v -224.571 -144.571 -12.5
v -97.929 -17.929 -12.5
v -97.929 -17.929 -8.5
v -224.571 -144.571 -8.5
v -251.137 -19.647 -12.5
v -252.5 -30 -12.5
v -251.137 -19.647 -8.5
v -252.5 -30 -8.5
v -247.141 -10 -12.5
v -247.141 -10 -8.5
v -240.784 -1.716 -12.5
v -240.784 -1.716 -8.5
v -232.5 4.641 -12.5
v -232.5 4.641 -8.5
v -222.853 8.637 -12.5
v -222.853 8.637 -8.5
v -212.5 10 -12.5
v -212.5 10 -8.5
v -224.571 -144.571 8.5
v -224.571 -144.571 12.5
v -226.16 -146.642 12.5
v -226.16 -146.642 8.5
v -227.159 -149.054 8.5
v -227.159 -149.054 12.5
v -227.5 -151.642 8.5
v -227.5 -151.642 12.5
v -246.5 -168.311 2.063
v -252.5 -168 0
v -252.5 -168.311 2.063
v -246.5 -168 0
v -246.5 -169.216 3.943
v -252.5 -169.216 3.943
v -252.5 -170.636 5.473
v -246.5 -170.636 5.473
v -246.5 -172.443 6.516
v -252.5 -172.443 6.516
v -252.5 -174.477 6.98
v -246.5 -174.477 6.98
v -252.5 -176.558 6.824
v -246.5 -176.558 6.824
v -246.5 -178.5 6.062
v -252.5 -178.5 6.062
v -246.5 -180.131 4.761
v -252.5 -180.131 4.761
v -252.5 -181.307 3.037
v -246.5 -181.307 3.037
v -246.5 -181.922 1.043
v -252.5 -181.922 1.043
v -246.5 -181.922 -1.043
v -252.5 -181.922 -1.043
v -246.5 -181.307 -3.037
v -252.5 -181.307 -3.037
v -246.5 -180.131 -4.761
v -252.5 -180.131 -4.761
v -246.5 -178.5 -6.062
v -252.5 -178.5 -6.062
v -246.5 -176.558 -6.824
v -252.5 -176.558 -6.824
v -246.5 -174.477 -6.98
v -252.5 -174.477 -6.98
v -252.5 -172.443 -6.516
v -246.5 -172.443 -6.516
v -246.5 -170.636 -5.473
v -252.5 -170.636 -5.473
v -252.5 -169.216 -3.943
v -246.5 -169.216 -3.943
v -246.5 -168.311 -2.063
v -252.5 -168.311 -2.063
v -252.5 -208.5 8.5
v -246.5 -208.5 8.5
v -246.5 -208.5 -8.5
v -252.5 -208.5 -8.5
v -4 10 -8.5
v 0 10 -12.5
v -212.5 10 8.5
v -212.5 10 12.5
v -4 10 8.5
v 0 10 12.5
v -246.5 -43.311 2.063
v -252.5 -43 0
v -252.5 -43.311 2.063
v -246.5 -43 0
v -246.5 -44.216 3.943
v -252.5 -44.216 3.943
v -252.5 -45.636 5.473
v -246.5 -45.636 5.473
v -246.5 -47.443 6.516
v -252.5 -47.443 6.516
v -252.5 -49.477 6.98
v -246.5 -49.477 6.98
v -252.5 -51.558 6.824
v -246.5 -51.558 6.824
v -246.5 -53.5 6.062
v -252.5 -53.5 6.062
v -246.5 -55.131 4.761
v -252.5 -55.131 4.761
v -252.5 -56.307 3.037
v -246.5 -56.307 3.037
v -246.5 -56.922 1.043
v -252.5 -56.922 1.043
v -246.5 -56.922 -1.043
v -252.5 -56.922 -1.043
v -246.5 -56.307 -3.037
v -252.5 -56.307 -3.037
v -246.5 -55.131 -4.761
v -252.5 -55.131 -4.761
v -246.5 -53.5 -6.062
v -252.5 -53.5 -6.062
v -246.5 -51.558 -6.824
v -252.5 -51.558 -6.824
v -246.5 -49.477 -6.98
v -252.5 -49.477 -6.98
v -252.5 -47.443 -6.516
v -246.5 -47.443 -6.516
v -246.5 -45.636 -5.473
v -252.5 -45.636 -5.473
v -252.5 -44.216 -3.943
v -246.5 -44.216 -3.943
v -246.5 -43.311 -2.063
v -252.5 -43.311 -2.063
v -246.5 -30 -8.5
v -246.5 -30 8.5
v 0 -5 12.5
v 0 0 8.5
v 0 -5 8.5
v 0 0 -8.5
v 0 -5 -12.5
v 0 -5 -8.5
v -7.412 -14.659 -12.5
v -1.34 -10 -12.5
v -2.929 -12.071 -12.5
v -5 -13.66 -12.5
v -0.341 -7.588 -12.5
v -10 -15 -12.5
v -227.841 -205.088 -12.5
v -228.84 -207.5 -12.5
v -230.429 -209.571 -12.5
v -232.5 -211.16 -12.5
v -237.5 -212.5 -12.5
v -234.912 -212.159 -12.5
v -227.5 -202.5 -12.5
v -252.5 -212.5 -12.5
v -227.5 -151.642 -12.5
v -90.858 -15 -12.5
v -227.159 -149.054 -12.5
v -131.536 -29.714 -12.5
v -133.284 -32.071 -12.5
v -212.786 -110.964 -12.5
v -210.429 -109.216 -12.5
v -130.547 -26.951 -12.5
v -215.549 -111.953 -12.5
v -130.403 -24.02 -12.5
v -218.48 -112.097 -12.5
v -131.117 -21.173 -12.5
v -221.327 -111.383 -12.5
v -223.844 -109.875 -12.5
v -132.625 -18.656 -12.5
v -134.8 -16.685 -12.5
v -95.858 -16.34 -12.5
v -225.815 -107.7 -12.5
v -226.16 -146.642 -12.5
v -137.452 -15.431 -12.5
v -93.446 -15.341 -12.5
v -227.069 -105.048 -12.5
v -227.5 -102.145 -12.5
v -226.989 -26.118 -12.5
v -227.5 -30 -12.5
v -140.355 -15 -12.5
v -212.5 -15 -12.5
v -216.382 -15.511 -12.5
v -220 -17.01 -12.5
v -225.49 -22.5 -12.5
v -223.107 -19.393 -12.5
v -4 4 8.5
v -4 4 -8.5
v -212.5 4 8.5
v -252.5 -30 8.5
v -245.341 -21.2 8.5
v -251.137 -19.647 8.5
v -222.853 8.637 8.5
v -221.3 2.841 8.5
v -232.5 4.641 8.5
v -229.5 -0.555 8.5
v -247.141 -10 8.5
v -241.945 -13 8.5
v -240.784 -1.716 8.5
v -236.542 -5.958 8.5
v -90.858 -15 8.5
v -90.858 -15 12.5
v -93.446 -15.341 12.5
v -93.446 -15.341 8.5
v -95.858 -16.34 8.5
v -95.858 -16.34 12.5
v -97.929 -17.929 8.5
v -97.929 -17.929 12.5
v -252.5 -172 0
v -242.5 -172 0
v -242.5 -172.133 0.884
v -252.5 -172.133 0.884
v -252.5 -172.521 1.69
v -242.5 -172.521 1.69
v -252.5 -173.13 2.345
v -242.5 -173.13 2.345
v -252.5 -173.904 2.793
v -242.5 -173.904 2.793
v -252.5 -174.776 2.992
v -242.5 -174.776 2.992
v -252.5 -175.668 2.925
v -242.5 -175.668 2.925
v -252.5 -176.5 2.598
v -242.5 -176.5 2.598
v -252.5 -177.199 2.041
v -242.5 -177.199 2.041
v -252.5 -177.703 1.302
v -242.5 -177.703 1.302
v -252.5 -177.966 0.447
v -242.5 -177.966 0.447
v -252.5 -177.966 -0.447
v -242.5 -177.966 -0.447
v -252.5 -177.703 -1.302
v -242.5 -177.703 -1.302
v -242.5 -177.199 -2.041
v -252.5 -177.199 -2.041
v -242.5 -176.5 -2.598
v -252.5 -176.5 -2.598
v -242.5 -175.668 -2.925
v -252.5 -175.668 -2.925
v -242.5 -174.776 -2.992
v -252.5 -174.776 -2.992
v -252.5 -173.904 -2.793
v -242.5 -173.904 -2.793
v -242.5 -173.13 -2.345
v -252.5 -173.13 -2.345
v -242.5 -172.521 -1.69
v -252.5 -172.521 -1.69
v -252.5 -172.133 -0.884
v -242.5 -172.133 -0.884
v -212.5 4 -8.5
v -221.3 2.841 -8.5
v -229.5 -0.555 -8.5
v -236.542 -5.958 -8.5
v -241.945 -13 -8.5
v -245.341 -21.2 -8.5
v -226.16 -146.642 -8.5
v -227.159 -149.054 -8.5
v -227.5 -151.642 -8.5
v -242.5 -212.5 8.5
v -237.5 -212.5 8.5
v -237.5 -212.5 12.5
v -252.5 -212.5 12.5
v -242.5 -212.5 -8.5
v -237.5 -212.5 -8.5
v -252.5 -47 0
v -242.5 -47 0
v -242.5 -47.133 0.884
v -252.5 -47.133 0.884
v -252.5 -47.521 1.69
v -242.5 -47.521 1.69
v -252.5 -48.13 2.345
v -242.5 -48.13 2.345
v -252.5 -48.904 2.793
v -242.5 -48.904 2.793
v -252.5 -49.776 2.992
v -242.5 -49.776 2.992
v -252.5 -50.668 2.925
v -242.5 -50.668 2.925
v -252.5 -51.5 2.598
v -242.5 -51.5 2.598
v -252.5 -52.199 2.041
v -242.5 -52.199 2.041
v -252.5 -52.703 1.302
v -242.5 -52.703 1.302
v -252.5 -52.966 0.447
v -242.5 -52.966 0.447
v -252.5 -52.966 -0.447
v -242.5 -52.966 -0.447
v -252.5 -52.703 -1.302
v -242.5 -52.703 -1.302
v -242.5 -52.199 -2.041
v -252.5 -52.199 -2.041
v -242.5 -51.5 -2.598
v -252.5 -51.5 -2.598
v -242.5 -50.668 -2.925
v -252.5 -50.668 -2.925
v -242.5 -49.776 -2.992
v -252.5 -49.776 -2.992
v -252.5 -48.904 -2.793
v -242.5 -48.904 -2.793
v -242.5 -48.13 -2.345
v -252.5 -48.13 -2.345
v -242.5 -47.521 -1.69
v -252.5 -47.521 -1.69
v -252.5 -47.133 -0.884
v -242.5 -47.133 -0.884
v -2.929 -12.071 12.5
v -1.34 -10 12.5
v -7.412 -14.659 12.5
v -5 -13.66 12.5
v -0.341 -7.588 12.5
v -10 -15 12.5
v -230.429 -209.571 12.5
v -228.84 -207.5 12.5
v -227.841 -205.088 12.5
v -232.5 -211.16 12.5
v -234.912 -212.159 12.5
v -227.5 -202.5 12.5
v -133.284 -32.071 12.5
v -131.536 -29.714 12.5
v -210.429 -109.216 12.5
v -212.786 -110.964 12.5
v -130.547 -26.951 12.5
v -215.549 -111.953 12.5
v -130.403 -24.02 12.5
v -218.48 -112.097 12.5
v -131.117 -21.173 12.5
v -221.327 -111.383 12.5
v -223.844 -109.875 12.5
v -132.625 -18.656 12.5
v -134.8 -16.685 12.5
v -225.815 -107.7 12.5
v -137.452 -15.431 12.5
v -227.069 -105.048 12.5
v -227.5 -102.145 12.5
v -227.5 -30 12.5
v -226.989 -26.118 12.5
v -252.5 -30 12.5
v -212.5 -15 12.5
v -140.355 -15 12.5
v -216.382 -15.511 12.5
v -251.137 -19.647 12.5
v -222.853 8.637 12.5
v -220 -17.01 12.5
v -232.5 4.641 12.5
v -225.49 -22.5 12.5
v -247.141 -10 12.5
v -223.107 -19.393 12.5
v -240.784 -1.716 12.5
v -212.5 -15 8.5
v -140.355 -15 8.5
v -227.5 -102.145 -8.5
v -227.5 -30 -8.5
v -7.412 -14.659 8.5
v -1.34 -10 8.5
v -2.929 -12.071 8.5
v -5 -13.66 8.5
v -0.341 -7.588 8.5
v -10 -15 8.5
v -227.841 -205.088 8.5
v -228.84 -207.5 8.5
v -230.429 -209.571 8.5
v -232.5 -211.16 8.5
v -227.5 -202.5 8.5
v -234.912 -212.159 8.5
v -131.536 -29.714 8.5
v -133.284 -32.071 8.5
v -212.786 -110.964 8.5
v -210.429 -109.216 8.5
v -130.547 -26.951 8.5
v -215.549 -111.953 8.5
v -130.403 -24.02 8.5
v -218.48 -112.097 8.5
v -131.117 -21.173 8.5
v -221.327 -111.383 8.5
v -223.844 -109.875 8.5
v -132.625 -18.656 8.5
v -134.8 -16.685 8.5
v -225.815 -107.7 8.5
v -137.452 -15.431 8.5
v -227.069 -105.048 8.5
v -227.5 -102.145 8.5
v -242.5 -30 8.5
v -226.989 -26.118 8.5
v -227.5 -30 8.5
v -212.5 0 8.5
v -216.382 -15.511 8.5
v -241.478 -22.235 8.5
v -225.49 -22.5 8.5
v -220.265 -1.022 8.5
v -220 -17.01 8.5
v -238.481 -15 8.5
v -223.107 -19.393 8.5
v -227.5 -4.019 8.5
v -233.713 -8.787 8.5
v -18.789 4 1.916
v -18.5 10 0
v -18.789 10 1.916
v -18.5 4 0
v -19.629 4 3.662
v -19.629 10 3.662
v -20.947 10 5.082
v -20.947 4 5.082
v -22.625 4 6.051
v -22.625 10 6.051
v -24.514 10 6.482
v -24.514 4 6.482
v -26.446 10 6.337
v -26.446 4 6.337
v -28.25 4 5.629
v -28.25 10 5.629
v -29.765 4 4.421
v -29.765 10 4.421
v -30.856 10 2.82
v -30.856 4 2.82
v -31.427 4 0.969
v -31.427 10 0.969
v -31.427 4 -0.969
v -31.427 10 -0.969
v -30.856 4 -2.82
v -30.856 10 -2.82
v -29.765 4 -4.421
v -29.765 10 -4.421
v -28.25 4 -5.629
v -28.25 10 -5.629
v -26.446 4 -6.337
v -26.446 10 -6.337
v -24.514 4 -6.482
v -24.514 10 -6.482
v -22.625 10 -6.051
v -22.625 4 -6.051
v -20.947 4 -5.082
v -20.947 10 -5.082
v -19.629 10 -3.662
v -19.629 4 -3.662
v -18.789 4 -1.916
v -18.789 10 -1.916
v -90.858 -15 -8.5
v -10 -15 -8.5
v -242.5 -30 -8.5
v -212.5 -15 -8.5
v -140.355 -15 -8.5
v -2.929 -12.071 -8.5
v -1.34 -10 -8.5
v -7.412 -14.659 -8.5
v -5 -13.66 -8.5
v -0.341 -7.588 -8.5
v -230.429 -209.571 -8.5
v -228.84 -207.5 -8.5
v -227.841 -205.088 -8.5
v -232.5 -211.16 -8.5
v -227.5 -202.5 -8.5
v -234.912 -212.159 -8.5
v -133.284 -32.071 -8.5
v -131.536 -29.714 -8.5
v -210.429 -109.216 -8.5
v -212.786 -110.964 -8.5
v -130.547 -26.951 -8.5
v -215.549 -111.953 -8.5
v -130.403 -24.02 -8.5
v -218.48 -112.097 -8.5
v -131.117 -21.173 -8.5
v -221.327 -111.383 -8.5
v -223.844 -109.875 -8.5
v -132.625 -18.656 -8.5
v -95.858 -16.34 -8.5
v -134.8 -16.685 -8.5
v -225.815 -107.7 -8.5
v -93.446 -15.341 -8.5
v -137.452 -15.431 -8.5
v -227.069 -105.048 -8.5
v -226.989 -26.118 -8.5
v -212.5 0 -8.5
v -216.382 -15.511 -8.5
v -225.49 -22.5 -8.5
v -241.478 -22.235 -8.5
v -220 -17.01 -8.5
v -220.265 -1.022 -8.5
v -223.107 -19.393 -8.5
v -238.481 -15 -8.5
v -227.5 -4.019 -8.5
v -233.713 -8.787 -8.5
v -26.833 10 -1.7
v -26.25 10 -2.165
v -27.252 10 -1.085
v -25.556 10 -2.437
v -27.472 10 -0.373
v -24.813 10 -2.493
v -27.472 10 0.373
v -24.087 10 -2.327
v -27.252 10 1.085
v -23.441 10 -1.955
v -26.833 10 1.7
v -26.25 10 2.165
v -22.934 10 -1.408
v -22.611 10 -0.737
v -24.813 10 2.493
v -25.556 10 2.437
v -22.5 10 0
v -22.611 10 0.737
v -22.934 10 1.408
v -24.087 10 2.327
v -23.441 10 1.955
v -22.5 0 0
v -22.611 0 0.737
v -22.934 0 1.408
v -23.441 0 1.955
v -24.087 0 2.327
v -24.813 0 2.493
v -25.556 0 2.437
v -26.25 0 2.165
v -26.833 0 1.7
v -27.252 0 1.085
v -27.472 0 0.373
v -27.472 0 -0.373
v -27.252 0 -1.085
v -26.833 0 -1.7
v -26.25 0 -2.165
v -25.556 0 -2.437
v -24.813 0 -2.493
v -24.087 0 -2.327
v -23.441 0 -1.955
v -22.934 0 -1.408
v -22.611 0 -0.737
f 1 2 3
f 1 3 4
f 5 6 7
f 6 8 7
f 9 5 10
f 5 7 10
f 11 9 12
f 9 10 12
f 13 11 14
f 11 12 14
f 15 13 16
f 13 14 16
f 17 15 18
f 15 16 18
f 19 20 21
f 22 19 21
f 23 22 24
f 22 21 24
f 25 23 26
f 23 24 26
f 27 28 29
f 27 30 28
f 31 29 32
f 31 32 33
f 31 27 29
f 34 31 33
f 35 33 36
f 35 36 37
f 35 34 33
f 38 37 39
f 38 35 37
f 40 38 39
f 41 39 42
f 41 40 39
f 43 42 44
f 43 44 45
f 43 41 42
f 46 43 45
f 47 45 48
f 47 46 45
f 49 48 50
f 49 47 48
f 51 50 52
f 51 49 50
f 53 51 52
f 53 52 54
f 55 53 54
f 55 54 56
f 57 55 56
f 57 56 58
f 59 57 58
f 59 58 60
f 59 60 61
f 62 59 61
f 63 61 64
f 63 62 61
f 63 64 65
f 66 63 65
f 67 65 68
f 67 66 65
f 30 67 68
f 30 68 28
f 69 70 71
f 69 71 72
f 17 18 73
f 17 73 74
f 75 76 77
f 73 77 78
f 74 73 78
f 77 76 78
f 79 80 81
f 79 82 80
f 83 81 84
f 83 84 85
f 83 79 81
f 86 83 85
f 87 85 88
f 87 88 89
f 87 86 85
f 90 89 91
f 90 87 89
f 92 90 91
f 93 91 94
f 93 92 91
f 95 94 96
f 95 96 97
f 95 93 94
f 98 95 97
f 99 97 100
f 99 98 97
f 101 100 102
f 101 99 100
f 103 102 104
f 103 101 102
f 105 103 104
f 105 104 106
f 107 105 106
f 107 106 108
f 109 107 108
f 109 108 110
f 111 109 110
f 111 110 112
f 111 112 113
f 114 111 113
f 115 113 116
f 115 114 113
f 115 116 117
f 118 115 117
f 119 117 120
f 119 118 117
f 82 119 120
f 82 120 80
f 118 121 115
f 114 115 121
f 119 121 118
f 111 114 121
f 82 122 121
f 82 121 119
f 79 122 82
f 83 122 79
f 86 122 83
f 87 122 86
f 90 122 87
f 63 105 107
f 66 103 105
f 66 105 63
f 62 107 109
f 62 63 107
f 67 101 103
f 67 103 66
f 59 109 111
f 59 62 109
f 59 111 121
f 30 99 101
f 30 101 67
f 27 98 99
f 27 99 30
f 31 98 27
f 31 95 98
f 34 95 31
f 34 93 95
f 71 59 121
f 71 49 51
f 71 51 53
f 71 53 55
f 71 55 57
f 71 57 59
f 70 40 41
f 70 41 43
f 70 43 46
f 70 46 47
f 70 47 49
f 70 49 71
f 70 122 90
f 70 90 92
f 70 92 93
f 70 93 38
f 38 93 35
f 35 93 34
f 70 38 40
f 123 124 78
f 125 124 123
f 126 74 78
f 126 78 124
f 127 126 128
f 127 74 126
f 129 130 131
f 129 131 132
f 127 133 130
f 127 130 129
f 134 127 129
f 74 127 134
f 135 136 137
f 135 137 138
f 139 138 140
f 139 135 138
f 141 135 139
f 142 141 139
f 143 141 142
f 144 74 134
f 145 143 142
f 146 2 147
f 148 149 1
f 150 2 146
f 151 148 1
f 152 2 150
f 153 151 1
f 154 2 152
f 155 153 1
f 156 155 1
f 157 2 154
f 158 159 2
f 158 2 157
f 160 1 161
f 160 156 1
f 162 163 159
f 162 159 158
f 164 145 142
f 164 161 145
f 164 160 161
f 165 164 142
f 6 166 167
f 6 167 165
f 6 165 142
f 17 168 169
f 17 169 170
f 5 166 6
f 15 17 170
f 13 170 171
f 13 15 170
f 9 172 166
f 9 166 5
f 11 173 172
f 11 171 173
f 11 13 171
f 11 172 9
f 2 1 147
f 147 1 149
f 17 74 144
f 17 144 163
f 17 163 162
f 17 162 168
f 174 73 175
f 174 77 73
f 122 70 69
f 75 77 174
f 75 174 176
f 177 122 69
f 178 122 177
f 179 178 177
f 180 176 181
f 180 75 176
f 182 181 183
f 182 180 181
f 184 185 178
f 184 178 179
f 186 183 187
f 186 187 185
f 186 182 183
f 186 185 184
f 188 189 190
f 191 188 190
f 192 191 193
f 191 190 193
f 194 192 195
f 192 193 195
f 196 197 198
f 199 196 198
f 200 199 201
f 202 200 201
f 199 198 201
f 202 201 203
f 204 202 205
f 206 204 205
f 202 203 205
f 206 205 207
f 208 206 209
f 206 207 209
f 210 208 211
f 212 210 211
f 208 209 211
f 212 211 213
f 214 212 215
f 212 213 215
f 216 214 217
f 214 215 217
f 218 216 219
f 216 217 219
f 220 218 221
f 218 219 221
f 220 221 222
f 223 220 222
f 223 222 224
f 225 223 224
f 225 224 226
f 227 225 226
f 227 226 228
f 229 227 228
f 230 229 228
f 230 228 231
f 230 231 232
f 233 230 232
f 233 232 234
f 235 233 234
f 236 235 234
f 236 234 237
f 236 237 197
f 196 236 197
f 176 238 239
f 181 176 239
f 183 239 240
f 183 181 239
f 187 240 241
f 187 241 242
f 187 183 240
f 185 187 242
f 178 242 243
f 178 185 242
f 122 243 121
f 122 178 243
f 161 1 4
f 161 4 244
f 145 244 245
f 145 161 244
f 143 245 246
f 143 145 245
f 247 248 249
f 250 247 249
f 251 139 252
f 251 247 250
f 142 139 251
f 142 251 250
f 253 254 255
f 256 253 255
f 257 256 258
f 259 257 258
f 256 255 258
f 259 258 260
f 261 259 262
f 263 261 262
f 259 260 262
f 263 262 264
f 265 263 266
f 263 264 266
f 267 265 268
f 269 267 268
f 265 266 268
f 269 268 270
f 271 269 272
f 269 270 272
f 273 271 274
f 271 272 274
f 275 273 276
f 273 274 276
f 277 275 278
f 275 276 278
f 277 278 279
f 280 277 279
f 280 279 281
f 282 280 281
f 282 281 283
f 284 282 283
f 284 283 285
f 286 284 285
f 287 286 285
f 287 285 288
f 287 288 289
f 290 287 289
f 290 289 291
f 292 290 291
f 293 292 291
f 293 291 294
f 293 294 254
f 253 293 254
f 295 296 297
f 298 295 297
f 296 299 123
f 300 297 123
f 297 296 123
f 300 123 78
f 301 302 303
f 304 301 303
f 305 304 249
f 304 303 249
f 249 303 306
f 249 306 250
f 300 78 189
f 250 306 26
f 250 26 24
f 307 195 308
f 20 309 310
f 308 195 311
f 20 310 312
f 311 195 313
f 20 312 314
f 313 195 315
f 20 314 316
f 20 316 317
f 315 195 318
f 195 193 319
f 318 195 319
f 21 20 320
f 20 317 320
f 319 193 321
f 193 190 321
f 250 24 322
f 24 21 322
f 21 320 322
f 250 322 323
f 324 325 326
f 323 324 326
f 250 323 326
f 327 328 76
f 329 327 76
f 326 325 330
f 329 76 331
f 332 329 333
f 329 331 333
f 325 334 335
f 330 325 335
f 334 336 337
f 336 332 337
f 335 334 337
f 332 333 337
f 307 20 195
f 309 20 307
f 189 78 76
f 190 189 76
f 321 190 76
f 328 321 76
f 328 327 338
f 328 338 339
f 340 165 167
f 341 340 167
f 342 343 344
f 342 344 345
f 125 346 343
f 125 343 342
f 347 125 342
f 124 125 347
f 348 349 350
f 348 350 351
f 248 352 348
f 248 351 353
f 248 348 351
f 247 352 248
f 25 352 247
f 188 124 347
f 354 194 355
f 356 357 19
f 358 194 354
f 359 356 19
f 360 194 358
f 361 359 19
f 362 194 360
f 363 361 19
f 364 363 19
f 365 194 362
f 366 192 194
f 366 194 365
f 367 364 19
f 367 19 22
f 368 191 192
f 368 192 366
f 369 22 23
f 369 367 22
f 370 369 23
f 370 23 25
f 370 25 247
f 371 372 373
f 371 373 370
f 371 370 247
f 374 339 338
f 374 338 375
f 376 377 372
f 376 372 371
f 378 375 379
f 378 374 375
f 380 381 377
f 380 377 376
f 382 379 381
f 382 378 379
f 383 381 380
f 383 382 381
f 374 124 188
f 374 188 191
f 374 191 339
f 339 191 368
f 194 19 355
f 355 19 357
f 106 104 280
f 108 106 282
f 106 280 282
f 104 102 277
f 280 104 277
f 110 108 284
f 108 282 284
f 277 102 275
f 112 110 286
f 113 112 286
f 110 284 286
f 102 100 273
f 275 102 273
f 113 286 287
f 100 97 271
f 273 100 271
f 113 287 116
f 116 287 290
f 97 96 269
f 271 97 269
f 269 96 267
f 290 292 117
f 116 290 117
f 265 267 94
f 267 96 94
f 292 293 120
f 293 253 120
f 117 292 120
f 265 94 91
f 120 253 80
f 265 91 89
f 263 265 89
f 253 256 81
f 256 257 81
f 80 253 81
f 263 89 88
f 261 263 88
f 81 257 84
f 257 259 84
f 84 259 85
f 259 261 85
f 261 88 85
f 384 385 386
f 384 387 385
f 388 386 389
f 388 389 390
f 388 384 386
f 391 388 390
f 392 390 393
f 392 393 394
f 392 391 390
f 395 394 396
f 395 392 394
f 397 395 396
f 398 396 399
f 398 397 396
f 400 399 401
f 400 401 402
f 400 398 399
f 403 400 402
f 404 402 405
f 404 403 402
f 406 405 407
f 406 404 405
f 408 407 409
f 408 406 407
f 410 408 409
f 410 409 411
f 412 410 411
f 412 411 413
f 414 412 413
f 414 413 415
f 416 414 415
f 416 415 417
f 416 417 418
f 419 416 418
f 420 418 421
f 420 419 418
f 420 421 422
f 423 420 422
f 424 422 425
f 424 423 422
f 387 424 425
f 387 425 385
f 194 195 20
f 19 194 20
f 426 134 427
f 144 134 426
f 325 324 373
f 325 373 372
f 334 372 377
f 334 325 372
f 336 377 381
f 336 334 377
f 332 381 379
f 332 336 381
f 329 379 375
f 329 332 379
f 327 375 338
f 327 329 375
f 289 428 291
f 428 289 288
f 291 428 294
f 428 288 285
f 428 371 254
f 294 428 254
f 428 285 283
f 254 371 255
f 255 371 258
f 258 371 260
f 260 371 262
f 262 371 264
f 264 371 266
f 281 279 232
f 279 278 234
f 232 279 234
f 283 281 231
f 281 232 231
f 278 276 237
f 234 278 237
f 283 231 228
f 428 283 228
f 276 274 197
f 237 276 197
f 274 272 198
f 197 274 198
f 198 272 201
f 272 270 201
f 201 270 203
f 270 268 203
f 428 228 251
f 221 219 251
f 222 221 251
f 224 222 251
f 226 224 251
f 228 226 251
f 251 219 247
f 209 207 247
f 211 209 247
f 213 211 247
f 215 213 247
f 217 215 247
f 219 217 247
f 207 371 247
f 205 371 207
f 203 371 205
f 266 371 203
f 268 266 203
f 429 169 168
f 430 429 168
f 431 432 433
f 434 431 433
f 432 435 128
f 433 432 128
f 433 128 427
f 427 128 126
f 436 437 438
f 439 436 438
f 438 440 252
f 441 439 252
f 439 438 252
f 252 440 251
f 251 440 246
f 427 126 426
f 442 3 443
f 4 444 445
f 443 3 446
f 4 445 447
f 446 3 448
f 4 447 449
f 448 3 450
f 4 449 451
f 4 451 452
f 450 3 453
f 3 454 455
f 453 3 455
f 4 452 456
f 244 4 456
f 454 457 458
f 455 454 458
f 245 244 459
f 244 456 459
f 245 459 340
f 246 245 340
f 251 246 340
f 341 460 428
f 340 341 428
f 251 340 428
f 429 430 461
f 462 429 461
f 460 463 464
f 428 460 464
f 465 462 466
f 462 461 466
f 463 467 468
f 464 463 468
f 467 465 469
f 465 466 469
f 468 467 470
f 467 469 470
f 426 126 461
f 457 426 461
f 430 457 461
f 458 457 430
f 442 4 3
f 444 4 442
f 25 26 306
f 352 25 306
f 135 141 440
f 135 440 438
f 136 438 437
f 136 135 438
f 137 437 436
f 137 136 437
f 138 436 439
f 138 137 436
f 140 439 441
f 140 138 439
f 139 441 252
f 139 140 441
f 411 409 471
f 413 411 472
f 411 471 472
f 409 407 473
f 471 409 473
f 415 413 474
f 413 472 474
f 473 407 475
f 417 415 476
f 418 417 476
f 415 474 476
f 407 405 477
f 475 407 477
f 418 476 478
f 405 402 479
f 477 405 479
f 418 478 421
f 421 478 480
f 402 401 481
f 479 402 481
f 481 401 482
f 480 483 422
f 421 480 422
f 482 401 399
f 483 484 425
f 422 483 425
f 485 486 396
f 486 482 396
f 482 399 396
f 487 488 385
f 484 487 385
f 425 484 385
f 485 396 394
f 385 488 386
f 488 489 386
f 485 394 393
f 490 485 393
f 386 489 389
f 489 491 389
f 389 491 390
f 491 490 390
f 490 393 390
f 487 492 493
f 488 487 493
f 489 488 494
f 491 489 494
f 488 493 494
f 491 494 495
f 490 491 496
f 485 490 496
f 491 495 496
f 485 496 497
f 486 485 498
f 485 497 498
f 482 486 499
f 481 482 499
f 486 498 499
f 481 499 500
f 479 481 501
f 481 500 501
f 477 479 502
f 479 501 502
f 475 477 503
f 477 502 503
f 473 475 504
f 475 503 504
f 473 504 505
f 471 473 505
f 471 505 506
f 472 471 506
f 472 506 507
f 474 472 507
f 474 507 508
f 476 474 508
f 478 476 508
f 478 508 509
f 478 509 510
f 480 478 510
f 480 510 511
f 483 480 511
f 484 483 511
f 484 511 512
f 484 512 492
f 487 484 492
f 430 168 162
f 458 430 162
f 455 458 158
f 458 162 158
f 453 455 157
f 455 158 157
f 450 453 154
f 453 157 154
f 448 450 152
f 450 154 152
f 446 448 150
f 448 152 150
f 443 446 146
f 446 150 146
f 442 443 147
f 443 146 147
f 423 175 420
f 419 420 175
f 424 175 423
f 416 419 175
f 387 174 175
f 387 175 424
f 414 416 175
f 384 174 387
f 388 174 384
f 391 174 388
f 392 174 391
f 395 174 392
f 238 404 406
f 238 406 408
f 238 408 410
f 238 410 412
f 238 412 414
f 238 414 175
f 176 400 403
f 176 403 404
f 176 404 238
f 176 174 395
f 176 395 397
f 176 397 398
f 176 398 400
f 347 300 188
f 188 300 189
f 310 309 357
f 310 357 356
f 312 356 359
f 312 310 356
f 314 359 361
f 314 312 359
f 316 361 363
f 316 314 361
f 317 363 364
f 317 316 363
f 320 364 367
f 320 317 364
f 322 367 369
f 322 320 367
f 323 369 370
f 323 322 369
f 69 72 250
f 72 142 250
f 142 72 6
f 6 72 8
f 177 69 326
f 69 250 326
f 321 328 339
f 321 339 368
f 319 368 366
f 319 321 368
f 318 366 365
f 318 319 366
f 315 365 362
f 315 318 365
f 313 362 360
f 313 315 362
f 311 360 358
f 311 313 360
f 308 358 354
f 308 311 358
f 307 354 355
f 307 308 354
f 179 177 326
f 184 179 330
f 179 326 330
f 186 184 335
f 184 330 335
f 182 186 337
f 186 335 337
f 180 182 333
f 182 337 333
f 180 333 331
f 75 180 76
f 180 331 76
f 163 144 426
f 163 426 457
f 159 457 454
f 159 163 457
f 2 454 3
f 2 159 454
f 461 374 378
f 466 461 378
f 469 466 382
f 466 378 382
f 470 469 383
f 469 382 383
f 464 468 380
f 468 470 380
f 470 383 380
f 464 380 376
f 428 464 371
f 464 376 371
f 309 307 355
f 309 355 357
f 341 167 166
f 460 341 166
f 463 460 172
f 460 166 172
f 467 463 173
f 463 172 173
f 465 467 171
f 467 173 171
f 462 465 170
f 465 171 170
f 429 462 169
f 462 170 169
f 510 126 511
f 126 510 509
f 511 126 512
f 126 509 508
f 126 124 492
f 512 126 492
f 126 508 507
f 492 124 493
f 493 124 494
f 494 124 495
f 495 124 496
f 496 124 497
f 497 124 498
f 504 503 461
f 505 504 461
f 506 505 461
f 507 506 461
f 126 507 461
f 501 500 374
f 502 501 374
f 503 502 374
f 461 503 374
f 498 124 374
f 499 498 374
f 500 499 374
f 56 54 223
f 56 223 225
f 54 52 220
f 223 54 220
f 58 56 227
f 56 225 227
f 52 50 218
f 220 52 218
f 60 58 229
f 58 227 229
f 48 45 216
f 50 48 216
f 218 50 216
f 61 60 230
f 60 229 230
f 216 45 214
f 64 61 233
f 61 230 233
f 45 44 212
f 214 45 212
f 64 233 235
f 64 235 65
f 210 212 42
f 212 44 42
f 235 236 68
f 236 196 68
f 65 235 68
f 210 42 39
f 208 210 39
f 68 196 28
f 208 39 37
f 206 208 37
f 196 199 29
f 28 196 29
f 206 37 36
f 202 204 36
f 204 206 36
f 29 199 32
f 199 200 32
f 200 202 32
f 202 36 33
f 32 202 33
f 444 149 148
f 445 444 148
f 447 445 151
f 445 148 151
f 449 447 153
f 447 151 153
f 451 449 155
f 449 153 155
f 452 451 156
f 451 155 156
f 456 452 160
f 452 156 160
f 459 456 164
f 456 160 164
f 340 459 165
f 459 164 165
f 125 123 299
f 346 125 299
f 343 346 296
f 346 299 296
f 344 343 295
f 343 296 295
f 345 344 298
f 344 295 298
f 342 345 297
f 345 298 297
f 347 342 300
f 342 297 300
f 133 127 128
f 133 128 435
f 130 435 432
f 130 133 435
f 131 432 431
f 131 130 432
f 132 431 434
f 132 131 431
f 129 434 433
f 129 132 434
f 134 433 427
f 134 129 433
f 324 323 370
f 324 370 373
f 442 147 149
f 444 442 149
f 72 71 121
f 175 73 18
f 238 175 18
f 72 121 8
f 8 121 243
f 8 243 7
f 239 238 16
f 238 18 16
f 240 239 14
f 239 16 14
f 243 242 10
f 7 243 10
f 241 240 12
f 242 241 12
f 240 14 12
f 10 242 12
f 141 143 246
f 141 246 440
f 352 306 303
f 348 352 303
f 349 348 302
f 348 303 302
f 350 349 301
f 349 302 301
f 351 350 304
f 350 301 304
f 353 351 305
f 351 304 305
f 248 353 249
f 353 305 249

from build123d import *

# Parameters (mm, degrees)
EXTRUSION1_DEPTH        = 12.5
ESQUISSE2_R             = 3
ENL_V_MAT_EXTRU_1_DEPTH = 323.674371464
ESQUISSE3_R             = 2.5
ENL_V_MAT_EXTRU_2_DEPTH = 331.255582845
COQUE1_T                = -4
EXTRUSION2_DEPTH        = 4


with BuildPart() as part:
    # Esquisse1 → Extrusion1 (new, symmetric)
    with BuildSketch(Plane.XY):
        with BuildLine():
            Line((0, 0), (-212.5, 0))
            ThreePointArc((-212.5, 0), (-233.713203436, -8.786796564), (-242.5, -30))
            Line((-242.5, -30), (-242.5, -212.5))
            Line((-242.5, -212.5), (-252.5, -212.5))
            Line((-252.5, -212.5), (-252.5, -30))
            ThreePointArc((-252.5, -30), (-240.784271247, -1.715728753), (-212.5, 10))
            Line((-212.5, 10), (0, 10))
            Line((0, 10), (0, 0))
        make_face()
    extrude(amount=EXTRUSION1_DEPTH, both=True)

    # Esquisse2 → Enlèv. mat.-Extru.1 (cut, through all)
    with BuildSketch(Plane(origin=(-242.5, 0, 0), x_dir=(0, 0, -1), z_dir=(1, 0, 0))):
        with Locations(Location((0, -50, 0), (0, 0, 90))):
            Circle(ESQUISSE2_R)
        with Locations(Location((0, -175, 0), (0, 0, 90))):
            Circle(ESQUISSE2_R)
    extrude(amount=-ENL_V_MAT_EXTRU_1_DEPTH, mode=Mode.SUBTRACT)

    # Esquisse3 → Enlèv. mat.-Extru.2 (cut, through all)
    with BuildSketch(Plane.XZ):
        with Locations((-25, 0)):
            Circle(ESQUISSE3_R)
    extrude(amount=-ENL_V_MAT_EXTRU_2_DEPTH, mode=Mode.SUBTRACT)

    # Coque1
    coque1_openings = [part.faces().sort_by_distance(p)[0] for p in [
        (-252.5, -121.359810516, 0),
        (-240.784271247, -1.715728753, 0),
        (-106.551413319, 10, 0),
    ]]
    offset(amount=COQUE1_T, openings=coque1_openings, kind=Kind.INTERSECTION)

    # Esquisse4 → Extrusion2 (add)
    with BuildSketch(Plane.XY.offset(12.5)):
        with BuildLine():
            Line((-212.5, 0), (0, 0))
            Line((0, 0), (0, -5))
            ThreePointArc((0, -5), (-2.928932188, -12.071067812), (-10, -15))
            Line((-10, -15), (-90.857864376, -15))
            ThreePointArc((-90.857864376, -15), (-94.6846987, -15.761204675), (-97.928932188, -17.928932188))
            Line((-97.928932188, -17.928932188), (-224.571067812, -144.571067812))
            ThreePointArc((-224.571067812, -144.571067812), (-226.738795325, -147.8153013), (-227.5, -151.642135624))
            Line((-227.5, -151.642135624), (-227.5, -202.5))
            ThreePointArc((-227.5, -202.5), (-230.428932188, -209.571067812), (-237.5, -212.5))
            Line((-237.5, -212.5), (-242.5, -212.5))
            Line((-242.5, -212.5), (-242.5, -30))
            ThreePointArc((-242.5, -30), (-233.713203436, -8.786796564), (-212.5, 0))
        make_face()
        with BuildLine():
            Line((-212.5, -15), (-140.355339059, -15))
            ThreePointArc((-140.355339059, -15), (-131.116543734, -21.173165676), (-133.284271247, -32.071067812))
            Line((-133.284271247, -32.071067812), (-210.428932188, -109.215728753))
            ThreePointArc((-210.428932188, -109.215728753), (-221.326834324, -111.383456266), (-227.5, -102.144660941))
            Line((-227.5, -102.144660941), (-227.5, -30))
            ThreePointArc((-227.5, -30), (-223.106601718, -19.393398282), (-212.5, -15))
        make_face(mode=Mode.SUBTRACT)
    extrusion2 = extrude(amount=-EXTRUSION2_DEPTH)

    # Symétrie1: Extrusion2 across plane
    add(extrusion2.mirror(Plane.XY))


solid = part.part
